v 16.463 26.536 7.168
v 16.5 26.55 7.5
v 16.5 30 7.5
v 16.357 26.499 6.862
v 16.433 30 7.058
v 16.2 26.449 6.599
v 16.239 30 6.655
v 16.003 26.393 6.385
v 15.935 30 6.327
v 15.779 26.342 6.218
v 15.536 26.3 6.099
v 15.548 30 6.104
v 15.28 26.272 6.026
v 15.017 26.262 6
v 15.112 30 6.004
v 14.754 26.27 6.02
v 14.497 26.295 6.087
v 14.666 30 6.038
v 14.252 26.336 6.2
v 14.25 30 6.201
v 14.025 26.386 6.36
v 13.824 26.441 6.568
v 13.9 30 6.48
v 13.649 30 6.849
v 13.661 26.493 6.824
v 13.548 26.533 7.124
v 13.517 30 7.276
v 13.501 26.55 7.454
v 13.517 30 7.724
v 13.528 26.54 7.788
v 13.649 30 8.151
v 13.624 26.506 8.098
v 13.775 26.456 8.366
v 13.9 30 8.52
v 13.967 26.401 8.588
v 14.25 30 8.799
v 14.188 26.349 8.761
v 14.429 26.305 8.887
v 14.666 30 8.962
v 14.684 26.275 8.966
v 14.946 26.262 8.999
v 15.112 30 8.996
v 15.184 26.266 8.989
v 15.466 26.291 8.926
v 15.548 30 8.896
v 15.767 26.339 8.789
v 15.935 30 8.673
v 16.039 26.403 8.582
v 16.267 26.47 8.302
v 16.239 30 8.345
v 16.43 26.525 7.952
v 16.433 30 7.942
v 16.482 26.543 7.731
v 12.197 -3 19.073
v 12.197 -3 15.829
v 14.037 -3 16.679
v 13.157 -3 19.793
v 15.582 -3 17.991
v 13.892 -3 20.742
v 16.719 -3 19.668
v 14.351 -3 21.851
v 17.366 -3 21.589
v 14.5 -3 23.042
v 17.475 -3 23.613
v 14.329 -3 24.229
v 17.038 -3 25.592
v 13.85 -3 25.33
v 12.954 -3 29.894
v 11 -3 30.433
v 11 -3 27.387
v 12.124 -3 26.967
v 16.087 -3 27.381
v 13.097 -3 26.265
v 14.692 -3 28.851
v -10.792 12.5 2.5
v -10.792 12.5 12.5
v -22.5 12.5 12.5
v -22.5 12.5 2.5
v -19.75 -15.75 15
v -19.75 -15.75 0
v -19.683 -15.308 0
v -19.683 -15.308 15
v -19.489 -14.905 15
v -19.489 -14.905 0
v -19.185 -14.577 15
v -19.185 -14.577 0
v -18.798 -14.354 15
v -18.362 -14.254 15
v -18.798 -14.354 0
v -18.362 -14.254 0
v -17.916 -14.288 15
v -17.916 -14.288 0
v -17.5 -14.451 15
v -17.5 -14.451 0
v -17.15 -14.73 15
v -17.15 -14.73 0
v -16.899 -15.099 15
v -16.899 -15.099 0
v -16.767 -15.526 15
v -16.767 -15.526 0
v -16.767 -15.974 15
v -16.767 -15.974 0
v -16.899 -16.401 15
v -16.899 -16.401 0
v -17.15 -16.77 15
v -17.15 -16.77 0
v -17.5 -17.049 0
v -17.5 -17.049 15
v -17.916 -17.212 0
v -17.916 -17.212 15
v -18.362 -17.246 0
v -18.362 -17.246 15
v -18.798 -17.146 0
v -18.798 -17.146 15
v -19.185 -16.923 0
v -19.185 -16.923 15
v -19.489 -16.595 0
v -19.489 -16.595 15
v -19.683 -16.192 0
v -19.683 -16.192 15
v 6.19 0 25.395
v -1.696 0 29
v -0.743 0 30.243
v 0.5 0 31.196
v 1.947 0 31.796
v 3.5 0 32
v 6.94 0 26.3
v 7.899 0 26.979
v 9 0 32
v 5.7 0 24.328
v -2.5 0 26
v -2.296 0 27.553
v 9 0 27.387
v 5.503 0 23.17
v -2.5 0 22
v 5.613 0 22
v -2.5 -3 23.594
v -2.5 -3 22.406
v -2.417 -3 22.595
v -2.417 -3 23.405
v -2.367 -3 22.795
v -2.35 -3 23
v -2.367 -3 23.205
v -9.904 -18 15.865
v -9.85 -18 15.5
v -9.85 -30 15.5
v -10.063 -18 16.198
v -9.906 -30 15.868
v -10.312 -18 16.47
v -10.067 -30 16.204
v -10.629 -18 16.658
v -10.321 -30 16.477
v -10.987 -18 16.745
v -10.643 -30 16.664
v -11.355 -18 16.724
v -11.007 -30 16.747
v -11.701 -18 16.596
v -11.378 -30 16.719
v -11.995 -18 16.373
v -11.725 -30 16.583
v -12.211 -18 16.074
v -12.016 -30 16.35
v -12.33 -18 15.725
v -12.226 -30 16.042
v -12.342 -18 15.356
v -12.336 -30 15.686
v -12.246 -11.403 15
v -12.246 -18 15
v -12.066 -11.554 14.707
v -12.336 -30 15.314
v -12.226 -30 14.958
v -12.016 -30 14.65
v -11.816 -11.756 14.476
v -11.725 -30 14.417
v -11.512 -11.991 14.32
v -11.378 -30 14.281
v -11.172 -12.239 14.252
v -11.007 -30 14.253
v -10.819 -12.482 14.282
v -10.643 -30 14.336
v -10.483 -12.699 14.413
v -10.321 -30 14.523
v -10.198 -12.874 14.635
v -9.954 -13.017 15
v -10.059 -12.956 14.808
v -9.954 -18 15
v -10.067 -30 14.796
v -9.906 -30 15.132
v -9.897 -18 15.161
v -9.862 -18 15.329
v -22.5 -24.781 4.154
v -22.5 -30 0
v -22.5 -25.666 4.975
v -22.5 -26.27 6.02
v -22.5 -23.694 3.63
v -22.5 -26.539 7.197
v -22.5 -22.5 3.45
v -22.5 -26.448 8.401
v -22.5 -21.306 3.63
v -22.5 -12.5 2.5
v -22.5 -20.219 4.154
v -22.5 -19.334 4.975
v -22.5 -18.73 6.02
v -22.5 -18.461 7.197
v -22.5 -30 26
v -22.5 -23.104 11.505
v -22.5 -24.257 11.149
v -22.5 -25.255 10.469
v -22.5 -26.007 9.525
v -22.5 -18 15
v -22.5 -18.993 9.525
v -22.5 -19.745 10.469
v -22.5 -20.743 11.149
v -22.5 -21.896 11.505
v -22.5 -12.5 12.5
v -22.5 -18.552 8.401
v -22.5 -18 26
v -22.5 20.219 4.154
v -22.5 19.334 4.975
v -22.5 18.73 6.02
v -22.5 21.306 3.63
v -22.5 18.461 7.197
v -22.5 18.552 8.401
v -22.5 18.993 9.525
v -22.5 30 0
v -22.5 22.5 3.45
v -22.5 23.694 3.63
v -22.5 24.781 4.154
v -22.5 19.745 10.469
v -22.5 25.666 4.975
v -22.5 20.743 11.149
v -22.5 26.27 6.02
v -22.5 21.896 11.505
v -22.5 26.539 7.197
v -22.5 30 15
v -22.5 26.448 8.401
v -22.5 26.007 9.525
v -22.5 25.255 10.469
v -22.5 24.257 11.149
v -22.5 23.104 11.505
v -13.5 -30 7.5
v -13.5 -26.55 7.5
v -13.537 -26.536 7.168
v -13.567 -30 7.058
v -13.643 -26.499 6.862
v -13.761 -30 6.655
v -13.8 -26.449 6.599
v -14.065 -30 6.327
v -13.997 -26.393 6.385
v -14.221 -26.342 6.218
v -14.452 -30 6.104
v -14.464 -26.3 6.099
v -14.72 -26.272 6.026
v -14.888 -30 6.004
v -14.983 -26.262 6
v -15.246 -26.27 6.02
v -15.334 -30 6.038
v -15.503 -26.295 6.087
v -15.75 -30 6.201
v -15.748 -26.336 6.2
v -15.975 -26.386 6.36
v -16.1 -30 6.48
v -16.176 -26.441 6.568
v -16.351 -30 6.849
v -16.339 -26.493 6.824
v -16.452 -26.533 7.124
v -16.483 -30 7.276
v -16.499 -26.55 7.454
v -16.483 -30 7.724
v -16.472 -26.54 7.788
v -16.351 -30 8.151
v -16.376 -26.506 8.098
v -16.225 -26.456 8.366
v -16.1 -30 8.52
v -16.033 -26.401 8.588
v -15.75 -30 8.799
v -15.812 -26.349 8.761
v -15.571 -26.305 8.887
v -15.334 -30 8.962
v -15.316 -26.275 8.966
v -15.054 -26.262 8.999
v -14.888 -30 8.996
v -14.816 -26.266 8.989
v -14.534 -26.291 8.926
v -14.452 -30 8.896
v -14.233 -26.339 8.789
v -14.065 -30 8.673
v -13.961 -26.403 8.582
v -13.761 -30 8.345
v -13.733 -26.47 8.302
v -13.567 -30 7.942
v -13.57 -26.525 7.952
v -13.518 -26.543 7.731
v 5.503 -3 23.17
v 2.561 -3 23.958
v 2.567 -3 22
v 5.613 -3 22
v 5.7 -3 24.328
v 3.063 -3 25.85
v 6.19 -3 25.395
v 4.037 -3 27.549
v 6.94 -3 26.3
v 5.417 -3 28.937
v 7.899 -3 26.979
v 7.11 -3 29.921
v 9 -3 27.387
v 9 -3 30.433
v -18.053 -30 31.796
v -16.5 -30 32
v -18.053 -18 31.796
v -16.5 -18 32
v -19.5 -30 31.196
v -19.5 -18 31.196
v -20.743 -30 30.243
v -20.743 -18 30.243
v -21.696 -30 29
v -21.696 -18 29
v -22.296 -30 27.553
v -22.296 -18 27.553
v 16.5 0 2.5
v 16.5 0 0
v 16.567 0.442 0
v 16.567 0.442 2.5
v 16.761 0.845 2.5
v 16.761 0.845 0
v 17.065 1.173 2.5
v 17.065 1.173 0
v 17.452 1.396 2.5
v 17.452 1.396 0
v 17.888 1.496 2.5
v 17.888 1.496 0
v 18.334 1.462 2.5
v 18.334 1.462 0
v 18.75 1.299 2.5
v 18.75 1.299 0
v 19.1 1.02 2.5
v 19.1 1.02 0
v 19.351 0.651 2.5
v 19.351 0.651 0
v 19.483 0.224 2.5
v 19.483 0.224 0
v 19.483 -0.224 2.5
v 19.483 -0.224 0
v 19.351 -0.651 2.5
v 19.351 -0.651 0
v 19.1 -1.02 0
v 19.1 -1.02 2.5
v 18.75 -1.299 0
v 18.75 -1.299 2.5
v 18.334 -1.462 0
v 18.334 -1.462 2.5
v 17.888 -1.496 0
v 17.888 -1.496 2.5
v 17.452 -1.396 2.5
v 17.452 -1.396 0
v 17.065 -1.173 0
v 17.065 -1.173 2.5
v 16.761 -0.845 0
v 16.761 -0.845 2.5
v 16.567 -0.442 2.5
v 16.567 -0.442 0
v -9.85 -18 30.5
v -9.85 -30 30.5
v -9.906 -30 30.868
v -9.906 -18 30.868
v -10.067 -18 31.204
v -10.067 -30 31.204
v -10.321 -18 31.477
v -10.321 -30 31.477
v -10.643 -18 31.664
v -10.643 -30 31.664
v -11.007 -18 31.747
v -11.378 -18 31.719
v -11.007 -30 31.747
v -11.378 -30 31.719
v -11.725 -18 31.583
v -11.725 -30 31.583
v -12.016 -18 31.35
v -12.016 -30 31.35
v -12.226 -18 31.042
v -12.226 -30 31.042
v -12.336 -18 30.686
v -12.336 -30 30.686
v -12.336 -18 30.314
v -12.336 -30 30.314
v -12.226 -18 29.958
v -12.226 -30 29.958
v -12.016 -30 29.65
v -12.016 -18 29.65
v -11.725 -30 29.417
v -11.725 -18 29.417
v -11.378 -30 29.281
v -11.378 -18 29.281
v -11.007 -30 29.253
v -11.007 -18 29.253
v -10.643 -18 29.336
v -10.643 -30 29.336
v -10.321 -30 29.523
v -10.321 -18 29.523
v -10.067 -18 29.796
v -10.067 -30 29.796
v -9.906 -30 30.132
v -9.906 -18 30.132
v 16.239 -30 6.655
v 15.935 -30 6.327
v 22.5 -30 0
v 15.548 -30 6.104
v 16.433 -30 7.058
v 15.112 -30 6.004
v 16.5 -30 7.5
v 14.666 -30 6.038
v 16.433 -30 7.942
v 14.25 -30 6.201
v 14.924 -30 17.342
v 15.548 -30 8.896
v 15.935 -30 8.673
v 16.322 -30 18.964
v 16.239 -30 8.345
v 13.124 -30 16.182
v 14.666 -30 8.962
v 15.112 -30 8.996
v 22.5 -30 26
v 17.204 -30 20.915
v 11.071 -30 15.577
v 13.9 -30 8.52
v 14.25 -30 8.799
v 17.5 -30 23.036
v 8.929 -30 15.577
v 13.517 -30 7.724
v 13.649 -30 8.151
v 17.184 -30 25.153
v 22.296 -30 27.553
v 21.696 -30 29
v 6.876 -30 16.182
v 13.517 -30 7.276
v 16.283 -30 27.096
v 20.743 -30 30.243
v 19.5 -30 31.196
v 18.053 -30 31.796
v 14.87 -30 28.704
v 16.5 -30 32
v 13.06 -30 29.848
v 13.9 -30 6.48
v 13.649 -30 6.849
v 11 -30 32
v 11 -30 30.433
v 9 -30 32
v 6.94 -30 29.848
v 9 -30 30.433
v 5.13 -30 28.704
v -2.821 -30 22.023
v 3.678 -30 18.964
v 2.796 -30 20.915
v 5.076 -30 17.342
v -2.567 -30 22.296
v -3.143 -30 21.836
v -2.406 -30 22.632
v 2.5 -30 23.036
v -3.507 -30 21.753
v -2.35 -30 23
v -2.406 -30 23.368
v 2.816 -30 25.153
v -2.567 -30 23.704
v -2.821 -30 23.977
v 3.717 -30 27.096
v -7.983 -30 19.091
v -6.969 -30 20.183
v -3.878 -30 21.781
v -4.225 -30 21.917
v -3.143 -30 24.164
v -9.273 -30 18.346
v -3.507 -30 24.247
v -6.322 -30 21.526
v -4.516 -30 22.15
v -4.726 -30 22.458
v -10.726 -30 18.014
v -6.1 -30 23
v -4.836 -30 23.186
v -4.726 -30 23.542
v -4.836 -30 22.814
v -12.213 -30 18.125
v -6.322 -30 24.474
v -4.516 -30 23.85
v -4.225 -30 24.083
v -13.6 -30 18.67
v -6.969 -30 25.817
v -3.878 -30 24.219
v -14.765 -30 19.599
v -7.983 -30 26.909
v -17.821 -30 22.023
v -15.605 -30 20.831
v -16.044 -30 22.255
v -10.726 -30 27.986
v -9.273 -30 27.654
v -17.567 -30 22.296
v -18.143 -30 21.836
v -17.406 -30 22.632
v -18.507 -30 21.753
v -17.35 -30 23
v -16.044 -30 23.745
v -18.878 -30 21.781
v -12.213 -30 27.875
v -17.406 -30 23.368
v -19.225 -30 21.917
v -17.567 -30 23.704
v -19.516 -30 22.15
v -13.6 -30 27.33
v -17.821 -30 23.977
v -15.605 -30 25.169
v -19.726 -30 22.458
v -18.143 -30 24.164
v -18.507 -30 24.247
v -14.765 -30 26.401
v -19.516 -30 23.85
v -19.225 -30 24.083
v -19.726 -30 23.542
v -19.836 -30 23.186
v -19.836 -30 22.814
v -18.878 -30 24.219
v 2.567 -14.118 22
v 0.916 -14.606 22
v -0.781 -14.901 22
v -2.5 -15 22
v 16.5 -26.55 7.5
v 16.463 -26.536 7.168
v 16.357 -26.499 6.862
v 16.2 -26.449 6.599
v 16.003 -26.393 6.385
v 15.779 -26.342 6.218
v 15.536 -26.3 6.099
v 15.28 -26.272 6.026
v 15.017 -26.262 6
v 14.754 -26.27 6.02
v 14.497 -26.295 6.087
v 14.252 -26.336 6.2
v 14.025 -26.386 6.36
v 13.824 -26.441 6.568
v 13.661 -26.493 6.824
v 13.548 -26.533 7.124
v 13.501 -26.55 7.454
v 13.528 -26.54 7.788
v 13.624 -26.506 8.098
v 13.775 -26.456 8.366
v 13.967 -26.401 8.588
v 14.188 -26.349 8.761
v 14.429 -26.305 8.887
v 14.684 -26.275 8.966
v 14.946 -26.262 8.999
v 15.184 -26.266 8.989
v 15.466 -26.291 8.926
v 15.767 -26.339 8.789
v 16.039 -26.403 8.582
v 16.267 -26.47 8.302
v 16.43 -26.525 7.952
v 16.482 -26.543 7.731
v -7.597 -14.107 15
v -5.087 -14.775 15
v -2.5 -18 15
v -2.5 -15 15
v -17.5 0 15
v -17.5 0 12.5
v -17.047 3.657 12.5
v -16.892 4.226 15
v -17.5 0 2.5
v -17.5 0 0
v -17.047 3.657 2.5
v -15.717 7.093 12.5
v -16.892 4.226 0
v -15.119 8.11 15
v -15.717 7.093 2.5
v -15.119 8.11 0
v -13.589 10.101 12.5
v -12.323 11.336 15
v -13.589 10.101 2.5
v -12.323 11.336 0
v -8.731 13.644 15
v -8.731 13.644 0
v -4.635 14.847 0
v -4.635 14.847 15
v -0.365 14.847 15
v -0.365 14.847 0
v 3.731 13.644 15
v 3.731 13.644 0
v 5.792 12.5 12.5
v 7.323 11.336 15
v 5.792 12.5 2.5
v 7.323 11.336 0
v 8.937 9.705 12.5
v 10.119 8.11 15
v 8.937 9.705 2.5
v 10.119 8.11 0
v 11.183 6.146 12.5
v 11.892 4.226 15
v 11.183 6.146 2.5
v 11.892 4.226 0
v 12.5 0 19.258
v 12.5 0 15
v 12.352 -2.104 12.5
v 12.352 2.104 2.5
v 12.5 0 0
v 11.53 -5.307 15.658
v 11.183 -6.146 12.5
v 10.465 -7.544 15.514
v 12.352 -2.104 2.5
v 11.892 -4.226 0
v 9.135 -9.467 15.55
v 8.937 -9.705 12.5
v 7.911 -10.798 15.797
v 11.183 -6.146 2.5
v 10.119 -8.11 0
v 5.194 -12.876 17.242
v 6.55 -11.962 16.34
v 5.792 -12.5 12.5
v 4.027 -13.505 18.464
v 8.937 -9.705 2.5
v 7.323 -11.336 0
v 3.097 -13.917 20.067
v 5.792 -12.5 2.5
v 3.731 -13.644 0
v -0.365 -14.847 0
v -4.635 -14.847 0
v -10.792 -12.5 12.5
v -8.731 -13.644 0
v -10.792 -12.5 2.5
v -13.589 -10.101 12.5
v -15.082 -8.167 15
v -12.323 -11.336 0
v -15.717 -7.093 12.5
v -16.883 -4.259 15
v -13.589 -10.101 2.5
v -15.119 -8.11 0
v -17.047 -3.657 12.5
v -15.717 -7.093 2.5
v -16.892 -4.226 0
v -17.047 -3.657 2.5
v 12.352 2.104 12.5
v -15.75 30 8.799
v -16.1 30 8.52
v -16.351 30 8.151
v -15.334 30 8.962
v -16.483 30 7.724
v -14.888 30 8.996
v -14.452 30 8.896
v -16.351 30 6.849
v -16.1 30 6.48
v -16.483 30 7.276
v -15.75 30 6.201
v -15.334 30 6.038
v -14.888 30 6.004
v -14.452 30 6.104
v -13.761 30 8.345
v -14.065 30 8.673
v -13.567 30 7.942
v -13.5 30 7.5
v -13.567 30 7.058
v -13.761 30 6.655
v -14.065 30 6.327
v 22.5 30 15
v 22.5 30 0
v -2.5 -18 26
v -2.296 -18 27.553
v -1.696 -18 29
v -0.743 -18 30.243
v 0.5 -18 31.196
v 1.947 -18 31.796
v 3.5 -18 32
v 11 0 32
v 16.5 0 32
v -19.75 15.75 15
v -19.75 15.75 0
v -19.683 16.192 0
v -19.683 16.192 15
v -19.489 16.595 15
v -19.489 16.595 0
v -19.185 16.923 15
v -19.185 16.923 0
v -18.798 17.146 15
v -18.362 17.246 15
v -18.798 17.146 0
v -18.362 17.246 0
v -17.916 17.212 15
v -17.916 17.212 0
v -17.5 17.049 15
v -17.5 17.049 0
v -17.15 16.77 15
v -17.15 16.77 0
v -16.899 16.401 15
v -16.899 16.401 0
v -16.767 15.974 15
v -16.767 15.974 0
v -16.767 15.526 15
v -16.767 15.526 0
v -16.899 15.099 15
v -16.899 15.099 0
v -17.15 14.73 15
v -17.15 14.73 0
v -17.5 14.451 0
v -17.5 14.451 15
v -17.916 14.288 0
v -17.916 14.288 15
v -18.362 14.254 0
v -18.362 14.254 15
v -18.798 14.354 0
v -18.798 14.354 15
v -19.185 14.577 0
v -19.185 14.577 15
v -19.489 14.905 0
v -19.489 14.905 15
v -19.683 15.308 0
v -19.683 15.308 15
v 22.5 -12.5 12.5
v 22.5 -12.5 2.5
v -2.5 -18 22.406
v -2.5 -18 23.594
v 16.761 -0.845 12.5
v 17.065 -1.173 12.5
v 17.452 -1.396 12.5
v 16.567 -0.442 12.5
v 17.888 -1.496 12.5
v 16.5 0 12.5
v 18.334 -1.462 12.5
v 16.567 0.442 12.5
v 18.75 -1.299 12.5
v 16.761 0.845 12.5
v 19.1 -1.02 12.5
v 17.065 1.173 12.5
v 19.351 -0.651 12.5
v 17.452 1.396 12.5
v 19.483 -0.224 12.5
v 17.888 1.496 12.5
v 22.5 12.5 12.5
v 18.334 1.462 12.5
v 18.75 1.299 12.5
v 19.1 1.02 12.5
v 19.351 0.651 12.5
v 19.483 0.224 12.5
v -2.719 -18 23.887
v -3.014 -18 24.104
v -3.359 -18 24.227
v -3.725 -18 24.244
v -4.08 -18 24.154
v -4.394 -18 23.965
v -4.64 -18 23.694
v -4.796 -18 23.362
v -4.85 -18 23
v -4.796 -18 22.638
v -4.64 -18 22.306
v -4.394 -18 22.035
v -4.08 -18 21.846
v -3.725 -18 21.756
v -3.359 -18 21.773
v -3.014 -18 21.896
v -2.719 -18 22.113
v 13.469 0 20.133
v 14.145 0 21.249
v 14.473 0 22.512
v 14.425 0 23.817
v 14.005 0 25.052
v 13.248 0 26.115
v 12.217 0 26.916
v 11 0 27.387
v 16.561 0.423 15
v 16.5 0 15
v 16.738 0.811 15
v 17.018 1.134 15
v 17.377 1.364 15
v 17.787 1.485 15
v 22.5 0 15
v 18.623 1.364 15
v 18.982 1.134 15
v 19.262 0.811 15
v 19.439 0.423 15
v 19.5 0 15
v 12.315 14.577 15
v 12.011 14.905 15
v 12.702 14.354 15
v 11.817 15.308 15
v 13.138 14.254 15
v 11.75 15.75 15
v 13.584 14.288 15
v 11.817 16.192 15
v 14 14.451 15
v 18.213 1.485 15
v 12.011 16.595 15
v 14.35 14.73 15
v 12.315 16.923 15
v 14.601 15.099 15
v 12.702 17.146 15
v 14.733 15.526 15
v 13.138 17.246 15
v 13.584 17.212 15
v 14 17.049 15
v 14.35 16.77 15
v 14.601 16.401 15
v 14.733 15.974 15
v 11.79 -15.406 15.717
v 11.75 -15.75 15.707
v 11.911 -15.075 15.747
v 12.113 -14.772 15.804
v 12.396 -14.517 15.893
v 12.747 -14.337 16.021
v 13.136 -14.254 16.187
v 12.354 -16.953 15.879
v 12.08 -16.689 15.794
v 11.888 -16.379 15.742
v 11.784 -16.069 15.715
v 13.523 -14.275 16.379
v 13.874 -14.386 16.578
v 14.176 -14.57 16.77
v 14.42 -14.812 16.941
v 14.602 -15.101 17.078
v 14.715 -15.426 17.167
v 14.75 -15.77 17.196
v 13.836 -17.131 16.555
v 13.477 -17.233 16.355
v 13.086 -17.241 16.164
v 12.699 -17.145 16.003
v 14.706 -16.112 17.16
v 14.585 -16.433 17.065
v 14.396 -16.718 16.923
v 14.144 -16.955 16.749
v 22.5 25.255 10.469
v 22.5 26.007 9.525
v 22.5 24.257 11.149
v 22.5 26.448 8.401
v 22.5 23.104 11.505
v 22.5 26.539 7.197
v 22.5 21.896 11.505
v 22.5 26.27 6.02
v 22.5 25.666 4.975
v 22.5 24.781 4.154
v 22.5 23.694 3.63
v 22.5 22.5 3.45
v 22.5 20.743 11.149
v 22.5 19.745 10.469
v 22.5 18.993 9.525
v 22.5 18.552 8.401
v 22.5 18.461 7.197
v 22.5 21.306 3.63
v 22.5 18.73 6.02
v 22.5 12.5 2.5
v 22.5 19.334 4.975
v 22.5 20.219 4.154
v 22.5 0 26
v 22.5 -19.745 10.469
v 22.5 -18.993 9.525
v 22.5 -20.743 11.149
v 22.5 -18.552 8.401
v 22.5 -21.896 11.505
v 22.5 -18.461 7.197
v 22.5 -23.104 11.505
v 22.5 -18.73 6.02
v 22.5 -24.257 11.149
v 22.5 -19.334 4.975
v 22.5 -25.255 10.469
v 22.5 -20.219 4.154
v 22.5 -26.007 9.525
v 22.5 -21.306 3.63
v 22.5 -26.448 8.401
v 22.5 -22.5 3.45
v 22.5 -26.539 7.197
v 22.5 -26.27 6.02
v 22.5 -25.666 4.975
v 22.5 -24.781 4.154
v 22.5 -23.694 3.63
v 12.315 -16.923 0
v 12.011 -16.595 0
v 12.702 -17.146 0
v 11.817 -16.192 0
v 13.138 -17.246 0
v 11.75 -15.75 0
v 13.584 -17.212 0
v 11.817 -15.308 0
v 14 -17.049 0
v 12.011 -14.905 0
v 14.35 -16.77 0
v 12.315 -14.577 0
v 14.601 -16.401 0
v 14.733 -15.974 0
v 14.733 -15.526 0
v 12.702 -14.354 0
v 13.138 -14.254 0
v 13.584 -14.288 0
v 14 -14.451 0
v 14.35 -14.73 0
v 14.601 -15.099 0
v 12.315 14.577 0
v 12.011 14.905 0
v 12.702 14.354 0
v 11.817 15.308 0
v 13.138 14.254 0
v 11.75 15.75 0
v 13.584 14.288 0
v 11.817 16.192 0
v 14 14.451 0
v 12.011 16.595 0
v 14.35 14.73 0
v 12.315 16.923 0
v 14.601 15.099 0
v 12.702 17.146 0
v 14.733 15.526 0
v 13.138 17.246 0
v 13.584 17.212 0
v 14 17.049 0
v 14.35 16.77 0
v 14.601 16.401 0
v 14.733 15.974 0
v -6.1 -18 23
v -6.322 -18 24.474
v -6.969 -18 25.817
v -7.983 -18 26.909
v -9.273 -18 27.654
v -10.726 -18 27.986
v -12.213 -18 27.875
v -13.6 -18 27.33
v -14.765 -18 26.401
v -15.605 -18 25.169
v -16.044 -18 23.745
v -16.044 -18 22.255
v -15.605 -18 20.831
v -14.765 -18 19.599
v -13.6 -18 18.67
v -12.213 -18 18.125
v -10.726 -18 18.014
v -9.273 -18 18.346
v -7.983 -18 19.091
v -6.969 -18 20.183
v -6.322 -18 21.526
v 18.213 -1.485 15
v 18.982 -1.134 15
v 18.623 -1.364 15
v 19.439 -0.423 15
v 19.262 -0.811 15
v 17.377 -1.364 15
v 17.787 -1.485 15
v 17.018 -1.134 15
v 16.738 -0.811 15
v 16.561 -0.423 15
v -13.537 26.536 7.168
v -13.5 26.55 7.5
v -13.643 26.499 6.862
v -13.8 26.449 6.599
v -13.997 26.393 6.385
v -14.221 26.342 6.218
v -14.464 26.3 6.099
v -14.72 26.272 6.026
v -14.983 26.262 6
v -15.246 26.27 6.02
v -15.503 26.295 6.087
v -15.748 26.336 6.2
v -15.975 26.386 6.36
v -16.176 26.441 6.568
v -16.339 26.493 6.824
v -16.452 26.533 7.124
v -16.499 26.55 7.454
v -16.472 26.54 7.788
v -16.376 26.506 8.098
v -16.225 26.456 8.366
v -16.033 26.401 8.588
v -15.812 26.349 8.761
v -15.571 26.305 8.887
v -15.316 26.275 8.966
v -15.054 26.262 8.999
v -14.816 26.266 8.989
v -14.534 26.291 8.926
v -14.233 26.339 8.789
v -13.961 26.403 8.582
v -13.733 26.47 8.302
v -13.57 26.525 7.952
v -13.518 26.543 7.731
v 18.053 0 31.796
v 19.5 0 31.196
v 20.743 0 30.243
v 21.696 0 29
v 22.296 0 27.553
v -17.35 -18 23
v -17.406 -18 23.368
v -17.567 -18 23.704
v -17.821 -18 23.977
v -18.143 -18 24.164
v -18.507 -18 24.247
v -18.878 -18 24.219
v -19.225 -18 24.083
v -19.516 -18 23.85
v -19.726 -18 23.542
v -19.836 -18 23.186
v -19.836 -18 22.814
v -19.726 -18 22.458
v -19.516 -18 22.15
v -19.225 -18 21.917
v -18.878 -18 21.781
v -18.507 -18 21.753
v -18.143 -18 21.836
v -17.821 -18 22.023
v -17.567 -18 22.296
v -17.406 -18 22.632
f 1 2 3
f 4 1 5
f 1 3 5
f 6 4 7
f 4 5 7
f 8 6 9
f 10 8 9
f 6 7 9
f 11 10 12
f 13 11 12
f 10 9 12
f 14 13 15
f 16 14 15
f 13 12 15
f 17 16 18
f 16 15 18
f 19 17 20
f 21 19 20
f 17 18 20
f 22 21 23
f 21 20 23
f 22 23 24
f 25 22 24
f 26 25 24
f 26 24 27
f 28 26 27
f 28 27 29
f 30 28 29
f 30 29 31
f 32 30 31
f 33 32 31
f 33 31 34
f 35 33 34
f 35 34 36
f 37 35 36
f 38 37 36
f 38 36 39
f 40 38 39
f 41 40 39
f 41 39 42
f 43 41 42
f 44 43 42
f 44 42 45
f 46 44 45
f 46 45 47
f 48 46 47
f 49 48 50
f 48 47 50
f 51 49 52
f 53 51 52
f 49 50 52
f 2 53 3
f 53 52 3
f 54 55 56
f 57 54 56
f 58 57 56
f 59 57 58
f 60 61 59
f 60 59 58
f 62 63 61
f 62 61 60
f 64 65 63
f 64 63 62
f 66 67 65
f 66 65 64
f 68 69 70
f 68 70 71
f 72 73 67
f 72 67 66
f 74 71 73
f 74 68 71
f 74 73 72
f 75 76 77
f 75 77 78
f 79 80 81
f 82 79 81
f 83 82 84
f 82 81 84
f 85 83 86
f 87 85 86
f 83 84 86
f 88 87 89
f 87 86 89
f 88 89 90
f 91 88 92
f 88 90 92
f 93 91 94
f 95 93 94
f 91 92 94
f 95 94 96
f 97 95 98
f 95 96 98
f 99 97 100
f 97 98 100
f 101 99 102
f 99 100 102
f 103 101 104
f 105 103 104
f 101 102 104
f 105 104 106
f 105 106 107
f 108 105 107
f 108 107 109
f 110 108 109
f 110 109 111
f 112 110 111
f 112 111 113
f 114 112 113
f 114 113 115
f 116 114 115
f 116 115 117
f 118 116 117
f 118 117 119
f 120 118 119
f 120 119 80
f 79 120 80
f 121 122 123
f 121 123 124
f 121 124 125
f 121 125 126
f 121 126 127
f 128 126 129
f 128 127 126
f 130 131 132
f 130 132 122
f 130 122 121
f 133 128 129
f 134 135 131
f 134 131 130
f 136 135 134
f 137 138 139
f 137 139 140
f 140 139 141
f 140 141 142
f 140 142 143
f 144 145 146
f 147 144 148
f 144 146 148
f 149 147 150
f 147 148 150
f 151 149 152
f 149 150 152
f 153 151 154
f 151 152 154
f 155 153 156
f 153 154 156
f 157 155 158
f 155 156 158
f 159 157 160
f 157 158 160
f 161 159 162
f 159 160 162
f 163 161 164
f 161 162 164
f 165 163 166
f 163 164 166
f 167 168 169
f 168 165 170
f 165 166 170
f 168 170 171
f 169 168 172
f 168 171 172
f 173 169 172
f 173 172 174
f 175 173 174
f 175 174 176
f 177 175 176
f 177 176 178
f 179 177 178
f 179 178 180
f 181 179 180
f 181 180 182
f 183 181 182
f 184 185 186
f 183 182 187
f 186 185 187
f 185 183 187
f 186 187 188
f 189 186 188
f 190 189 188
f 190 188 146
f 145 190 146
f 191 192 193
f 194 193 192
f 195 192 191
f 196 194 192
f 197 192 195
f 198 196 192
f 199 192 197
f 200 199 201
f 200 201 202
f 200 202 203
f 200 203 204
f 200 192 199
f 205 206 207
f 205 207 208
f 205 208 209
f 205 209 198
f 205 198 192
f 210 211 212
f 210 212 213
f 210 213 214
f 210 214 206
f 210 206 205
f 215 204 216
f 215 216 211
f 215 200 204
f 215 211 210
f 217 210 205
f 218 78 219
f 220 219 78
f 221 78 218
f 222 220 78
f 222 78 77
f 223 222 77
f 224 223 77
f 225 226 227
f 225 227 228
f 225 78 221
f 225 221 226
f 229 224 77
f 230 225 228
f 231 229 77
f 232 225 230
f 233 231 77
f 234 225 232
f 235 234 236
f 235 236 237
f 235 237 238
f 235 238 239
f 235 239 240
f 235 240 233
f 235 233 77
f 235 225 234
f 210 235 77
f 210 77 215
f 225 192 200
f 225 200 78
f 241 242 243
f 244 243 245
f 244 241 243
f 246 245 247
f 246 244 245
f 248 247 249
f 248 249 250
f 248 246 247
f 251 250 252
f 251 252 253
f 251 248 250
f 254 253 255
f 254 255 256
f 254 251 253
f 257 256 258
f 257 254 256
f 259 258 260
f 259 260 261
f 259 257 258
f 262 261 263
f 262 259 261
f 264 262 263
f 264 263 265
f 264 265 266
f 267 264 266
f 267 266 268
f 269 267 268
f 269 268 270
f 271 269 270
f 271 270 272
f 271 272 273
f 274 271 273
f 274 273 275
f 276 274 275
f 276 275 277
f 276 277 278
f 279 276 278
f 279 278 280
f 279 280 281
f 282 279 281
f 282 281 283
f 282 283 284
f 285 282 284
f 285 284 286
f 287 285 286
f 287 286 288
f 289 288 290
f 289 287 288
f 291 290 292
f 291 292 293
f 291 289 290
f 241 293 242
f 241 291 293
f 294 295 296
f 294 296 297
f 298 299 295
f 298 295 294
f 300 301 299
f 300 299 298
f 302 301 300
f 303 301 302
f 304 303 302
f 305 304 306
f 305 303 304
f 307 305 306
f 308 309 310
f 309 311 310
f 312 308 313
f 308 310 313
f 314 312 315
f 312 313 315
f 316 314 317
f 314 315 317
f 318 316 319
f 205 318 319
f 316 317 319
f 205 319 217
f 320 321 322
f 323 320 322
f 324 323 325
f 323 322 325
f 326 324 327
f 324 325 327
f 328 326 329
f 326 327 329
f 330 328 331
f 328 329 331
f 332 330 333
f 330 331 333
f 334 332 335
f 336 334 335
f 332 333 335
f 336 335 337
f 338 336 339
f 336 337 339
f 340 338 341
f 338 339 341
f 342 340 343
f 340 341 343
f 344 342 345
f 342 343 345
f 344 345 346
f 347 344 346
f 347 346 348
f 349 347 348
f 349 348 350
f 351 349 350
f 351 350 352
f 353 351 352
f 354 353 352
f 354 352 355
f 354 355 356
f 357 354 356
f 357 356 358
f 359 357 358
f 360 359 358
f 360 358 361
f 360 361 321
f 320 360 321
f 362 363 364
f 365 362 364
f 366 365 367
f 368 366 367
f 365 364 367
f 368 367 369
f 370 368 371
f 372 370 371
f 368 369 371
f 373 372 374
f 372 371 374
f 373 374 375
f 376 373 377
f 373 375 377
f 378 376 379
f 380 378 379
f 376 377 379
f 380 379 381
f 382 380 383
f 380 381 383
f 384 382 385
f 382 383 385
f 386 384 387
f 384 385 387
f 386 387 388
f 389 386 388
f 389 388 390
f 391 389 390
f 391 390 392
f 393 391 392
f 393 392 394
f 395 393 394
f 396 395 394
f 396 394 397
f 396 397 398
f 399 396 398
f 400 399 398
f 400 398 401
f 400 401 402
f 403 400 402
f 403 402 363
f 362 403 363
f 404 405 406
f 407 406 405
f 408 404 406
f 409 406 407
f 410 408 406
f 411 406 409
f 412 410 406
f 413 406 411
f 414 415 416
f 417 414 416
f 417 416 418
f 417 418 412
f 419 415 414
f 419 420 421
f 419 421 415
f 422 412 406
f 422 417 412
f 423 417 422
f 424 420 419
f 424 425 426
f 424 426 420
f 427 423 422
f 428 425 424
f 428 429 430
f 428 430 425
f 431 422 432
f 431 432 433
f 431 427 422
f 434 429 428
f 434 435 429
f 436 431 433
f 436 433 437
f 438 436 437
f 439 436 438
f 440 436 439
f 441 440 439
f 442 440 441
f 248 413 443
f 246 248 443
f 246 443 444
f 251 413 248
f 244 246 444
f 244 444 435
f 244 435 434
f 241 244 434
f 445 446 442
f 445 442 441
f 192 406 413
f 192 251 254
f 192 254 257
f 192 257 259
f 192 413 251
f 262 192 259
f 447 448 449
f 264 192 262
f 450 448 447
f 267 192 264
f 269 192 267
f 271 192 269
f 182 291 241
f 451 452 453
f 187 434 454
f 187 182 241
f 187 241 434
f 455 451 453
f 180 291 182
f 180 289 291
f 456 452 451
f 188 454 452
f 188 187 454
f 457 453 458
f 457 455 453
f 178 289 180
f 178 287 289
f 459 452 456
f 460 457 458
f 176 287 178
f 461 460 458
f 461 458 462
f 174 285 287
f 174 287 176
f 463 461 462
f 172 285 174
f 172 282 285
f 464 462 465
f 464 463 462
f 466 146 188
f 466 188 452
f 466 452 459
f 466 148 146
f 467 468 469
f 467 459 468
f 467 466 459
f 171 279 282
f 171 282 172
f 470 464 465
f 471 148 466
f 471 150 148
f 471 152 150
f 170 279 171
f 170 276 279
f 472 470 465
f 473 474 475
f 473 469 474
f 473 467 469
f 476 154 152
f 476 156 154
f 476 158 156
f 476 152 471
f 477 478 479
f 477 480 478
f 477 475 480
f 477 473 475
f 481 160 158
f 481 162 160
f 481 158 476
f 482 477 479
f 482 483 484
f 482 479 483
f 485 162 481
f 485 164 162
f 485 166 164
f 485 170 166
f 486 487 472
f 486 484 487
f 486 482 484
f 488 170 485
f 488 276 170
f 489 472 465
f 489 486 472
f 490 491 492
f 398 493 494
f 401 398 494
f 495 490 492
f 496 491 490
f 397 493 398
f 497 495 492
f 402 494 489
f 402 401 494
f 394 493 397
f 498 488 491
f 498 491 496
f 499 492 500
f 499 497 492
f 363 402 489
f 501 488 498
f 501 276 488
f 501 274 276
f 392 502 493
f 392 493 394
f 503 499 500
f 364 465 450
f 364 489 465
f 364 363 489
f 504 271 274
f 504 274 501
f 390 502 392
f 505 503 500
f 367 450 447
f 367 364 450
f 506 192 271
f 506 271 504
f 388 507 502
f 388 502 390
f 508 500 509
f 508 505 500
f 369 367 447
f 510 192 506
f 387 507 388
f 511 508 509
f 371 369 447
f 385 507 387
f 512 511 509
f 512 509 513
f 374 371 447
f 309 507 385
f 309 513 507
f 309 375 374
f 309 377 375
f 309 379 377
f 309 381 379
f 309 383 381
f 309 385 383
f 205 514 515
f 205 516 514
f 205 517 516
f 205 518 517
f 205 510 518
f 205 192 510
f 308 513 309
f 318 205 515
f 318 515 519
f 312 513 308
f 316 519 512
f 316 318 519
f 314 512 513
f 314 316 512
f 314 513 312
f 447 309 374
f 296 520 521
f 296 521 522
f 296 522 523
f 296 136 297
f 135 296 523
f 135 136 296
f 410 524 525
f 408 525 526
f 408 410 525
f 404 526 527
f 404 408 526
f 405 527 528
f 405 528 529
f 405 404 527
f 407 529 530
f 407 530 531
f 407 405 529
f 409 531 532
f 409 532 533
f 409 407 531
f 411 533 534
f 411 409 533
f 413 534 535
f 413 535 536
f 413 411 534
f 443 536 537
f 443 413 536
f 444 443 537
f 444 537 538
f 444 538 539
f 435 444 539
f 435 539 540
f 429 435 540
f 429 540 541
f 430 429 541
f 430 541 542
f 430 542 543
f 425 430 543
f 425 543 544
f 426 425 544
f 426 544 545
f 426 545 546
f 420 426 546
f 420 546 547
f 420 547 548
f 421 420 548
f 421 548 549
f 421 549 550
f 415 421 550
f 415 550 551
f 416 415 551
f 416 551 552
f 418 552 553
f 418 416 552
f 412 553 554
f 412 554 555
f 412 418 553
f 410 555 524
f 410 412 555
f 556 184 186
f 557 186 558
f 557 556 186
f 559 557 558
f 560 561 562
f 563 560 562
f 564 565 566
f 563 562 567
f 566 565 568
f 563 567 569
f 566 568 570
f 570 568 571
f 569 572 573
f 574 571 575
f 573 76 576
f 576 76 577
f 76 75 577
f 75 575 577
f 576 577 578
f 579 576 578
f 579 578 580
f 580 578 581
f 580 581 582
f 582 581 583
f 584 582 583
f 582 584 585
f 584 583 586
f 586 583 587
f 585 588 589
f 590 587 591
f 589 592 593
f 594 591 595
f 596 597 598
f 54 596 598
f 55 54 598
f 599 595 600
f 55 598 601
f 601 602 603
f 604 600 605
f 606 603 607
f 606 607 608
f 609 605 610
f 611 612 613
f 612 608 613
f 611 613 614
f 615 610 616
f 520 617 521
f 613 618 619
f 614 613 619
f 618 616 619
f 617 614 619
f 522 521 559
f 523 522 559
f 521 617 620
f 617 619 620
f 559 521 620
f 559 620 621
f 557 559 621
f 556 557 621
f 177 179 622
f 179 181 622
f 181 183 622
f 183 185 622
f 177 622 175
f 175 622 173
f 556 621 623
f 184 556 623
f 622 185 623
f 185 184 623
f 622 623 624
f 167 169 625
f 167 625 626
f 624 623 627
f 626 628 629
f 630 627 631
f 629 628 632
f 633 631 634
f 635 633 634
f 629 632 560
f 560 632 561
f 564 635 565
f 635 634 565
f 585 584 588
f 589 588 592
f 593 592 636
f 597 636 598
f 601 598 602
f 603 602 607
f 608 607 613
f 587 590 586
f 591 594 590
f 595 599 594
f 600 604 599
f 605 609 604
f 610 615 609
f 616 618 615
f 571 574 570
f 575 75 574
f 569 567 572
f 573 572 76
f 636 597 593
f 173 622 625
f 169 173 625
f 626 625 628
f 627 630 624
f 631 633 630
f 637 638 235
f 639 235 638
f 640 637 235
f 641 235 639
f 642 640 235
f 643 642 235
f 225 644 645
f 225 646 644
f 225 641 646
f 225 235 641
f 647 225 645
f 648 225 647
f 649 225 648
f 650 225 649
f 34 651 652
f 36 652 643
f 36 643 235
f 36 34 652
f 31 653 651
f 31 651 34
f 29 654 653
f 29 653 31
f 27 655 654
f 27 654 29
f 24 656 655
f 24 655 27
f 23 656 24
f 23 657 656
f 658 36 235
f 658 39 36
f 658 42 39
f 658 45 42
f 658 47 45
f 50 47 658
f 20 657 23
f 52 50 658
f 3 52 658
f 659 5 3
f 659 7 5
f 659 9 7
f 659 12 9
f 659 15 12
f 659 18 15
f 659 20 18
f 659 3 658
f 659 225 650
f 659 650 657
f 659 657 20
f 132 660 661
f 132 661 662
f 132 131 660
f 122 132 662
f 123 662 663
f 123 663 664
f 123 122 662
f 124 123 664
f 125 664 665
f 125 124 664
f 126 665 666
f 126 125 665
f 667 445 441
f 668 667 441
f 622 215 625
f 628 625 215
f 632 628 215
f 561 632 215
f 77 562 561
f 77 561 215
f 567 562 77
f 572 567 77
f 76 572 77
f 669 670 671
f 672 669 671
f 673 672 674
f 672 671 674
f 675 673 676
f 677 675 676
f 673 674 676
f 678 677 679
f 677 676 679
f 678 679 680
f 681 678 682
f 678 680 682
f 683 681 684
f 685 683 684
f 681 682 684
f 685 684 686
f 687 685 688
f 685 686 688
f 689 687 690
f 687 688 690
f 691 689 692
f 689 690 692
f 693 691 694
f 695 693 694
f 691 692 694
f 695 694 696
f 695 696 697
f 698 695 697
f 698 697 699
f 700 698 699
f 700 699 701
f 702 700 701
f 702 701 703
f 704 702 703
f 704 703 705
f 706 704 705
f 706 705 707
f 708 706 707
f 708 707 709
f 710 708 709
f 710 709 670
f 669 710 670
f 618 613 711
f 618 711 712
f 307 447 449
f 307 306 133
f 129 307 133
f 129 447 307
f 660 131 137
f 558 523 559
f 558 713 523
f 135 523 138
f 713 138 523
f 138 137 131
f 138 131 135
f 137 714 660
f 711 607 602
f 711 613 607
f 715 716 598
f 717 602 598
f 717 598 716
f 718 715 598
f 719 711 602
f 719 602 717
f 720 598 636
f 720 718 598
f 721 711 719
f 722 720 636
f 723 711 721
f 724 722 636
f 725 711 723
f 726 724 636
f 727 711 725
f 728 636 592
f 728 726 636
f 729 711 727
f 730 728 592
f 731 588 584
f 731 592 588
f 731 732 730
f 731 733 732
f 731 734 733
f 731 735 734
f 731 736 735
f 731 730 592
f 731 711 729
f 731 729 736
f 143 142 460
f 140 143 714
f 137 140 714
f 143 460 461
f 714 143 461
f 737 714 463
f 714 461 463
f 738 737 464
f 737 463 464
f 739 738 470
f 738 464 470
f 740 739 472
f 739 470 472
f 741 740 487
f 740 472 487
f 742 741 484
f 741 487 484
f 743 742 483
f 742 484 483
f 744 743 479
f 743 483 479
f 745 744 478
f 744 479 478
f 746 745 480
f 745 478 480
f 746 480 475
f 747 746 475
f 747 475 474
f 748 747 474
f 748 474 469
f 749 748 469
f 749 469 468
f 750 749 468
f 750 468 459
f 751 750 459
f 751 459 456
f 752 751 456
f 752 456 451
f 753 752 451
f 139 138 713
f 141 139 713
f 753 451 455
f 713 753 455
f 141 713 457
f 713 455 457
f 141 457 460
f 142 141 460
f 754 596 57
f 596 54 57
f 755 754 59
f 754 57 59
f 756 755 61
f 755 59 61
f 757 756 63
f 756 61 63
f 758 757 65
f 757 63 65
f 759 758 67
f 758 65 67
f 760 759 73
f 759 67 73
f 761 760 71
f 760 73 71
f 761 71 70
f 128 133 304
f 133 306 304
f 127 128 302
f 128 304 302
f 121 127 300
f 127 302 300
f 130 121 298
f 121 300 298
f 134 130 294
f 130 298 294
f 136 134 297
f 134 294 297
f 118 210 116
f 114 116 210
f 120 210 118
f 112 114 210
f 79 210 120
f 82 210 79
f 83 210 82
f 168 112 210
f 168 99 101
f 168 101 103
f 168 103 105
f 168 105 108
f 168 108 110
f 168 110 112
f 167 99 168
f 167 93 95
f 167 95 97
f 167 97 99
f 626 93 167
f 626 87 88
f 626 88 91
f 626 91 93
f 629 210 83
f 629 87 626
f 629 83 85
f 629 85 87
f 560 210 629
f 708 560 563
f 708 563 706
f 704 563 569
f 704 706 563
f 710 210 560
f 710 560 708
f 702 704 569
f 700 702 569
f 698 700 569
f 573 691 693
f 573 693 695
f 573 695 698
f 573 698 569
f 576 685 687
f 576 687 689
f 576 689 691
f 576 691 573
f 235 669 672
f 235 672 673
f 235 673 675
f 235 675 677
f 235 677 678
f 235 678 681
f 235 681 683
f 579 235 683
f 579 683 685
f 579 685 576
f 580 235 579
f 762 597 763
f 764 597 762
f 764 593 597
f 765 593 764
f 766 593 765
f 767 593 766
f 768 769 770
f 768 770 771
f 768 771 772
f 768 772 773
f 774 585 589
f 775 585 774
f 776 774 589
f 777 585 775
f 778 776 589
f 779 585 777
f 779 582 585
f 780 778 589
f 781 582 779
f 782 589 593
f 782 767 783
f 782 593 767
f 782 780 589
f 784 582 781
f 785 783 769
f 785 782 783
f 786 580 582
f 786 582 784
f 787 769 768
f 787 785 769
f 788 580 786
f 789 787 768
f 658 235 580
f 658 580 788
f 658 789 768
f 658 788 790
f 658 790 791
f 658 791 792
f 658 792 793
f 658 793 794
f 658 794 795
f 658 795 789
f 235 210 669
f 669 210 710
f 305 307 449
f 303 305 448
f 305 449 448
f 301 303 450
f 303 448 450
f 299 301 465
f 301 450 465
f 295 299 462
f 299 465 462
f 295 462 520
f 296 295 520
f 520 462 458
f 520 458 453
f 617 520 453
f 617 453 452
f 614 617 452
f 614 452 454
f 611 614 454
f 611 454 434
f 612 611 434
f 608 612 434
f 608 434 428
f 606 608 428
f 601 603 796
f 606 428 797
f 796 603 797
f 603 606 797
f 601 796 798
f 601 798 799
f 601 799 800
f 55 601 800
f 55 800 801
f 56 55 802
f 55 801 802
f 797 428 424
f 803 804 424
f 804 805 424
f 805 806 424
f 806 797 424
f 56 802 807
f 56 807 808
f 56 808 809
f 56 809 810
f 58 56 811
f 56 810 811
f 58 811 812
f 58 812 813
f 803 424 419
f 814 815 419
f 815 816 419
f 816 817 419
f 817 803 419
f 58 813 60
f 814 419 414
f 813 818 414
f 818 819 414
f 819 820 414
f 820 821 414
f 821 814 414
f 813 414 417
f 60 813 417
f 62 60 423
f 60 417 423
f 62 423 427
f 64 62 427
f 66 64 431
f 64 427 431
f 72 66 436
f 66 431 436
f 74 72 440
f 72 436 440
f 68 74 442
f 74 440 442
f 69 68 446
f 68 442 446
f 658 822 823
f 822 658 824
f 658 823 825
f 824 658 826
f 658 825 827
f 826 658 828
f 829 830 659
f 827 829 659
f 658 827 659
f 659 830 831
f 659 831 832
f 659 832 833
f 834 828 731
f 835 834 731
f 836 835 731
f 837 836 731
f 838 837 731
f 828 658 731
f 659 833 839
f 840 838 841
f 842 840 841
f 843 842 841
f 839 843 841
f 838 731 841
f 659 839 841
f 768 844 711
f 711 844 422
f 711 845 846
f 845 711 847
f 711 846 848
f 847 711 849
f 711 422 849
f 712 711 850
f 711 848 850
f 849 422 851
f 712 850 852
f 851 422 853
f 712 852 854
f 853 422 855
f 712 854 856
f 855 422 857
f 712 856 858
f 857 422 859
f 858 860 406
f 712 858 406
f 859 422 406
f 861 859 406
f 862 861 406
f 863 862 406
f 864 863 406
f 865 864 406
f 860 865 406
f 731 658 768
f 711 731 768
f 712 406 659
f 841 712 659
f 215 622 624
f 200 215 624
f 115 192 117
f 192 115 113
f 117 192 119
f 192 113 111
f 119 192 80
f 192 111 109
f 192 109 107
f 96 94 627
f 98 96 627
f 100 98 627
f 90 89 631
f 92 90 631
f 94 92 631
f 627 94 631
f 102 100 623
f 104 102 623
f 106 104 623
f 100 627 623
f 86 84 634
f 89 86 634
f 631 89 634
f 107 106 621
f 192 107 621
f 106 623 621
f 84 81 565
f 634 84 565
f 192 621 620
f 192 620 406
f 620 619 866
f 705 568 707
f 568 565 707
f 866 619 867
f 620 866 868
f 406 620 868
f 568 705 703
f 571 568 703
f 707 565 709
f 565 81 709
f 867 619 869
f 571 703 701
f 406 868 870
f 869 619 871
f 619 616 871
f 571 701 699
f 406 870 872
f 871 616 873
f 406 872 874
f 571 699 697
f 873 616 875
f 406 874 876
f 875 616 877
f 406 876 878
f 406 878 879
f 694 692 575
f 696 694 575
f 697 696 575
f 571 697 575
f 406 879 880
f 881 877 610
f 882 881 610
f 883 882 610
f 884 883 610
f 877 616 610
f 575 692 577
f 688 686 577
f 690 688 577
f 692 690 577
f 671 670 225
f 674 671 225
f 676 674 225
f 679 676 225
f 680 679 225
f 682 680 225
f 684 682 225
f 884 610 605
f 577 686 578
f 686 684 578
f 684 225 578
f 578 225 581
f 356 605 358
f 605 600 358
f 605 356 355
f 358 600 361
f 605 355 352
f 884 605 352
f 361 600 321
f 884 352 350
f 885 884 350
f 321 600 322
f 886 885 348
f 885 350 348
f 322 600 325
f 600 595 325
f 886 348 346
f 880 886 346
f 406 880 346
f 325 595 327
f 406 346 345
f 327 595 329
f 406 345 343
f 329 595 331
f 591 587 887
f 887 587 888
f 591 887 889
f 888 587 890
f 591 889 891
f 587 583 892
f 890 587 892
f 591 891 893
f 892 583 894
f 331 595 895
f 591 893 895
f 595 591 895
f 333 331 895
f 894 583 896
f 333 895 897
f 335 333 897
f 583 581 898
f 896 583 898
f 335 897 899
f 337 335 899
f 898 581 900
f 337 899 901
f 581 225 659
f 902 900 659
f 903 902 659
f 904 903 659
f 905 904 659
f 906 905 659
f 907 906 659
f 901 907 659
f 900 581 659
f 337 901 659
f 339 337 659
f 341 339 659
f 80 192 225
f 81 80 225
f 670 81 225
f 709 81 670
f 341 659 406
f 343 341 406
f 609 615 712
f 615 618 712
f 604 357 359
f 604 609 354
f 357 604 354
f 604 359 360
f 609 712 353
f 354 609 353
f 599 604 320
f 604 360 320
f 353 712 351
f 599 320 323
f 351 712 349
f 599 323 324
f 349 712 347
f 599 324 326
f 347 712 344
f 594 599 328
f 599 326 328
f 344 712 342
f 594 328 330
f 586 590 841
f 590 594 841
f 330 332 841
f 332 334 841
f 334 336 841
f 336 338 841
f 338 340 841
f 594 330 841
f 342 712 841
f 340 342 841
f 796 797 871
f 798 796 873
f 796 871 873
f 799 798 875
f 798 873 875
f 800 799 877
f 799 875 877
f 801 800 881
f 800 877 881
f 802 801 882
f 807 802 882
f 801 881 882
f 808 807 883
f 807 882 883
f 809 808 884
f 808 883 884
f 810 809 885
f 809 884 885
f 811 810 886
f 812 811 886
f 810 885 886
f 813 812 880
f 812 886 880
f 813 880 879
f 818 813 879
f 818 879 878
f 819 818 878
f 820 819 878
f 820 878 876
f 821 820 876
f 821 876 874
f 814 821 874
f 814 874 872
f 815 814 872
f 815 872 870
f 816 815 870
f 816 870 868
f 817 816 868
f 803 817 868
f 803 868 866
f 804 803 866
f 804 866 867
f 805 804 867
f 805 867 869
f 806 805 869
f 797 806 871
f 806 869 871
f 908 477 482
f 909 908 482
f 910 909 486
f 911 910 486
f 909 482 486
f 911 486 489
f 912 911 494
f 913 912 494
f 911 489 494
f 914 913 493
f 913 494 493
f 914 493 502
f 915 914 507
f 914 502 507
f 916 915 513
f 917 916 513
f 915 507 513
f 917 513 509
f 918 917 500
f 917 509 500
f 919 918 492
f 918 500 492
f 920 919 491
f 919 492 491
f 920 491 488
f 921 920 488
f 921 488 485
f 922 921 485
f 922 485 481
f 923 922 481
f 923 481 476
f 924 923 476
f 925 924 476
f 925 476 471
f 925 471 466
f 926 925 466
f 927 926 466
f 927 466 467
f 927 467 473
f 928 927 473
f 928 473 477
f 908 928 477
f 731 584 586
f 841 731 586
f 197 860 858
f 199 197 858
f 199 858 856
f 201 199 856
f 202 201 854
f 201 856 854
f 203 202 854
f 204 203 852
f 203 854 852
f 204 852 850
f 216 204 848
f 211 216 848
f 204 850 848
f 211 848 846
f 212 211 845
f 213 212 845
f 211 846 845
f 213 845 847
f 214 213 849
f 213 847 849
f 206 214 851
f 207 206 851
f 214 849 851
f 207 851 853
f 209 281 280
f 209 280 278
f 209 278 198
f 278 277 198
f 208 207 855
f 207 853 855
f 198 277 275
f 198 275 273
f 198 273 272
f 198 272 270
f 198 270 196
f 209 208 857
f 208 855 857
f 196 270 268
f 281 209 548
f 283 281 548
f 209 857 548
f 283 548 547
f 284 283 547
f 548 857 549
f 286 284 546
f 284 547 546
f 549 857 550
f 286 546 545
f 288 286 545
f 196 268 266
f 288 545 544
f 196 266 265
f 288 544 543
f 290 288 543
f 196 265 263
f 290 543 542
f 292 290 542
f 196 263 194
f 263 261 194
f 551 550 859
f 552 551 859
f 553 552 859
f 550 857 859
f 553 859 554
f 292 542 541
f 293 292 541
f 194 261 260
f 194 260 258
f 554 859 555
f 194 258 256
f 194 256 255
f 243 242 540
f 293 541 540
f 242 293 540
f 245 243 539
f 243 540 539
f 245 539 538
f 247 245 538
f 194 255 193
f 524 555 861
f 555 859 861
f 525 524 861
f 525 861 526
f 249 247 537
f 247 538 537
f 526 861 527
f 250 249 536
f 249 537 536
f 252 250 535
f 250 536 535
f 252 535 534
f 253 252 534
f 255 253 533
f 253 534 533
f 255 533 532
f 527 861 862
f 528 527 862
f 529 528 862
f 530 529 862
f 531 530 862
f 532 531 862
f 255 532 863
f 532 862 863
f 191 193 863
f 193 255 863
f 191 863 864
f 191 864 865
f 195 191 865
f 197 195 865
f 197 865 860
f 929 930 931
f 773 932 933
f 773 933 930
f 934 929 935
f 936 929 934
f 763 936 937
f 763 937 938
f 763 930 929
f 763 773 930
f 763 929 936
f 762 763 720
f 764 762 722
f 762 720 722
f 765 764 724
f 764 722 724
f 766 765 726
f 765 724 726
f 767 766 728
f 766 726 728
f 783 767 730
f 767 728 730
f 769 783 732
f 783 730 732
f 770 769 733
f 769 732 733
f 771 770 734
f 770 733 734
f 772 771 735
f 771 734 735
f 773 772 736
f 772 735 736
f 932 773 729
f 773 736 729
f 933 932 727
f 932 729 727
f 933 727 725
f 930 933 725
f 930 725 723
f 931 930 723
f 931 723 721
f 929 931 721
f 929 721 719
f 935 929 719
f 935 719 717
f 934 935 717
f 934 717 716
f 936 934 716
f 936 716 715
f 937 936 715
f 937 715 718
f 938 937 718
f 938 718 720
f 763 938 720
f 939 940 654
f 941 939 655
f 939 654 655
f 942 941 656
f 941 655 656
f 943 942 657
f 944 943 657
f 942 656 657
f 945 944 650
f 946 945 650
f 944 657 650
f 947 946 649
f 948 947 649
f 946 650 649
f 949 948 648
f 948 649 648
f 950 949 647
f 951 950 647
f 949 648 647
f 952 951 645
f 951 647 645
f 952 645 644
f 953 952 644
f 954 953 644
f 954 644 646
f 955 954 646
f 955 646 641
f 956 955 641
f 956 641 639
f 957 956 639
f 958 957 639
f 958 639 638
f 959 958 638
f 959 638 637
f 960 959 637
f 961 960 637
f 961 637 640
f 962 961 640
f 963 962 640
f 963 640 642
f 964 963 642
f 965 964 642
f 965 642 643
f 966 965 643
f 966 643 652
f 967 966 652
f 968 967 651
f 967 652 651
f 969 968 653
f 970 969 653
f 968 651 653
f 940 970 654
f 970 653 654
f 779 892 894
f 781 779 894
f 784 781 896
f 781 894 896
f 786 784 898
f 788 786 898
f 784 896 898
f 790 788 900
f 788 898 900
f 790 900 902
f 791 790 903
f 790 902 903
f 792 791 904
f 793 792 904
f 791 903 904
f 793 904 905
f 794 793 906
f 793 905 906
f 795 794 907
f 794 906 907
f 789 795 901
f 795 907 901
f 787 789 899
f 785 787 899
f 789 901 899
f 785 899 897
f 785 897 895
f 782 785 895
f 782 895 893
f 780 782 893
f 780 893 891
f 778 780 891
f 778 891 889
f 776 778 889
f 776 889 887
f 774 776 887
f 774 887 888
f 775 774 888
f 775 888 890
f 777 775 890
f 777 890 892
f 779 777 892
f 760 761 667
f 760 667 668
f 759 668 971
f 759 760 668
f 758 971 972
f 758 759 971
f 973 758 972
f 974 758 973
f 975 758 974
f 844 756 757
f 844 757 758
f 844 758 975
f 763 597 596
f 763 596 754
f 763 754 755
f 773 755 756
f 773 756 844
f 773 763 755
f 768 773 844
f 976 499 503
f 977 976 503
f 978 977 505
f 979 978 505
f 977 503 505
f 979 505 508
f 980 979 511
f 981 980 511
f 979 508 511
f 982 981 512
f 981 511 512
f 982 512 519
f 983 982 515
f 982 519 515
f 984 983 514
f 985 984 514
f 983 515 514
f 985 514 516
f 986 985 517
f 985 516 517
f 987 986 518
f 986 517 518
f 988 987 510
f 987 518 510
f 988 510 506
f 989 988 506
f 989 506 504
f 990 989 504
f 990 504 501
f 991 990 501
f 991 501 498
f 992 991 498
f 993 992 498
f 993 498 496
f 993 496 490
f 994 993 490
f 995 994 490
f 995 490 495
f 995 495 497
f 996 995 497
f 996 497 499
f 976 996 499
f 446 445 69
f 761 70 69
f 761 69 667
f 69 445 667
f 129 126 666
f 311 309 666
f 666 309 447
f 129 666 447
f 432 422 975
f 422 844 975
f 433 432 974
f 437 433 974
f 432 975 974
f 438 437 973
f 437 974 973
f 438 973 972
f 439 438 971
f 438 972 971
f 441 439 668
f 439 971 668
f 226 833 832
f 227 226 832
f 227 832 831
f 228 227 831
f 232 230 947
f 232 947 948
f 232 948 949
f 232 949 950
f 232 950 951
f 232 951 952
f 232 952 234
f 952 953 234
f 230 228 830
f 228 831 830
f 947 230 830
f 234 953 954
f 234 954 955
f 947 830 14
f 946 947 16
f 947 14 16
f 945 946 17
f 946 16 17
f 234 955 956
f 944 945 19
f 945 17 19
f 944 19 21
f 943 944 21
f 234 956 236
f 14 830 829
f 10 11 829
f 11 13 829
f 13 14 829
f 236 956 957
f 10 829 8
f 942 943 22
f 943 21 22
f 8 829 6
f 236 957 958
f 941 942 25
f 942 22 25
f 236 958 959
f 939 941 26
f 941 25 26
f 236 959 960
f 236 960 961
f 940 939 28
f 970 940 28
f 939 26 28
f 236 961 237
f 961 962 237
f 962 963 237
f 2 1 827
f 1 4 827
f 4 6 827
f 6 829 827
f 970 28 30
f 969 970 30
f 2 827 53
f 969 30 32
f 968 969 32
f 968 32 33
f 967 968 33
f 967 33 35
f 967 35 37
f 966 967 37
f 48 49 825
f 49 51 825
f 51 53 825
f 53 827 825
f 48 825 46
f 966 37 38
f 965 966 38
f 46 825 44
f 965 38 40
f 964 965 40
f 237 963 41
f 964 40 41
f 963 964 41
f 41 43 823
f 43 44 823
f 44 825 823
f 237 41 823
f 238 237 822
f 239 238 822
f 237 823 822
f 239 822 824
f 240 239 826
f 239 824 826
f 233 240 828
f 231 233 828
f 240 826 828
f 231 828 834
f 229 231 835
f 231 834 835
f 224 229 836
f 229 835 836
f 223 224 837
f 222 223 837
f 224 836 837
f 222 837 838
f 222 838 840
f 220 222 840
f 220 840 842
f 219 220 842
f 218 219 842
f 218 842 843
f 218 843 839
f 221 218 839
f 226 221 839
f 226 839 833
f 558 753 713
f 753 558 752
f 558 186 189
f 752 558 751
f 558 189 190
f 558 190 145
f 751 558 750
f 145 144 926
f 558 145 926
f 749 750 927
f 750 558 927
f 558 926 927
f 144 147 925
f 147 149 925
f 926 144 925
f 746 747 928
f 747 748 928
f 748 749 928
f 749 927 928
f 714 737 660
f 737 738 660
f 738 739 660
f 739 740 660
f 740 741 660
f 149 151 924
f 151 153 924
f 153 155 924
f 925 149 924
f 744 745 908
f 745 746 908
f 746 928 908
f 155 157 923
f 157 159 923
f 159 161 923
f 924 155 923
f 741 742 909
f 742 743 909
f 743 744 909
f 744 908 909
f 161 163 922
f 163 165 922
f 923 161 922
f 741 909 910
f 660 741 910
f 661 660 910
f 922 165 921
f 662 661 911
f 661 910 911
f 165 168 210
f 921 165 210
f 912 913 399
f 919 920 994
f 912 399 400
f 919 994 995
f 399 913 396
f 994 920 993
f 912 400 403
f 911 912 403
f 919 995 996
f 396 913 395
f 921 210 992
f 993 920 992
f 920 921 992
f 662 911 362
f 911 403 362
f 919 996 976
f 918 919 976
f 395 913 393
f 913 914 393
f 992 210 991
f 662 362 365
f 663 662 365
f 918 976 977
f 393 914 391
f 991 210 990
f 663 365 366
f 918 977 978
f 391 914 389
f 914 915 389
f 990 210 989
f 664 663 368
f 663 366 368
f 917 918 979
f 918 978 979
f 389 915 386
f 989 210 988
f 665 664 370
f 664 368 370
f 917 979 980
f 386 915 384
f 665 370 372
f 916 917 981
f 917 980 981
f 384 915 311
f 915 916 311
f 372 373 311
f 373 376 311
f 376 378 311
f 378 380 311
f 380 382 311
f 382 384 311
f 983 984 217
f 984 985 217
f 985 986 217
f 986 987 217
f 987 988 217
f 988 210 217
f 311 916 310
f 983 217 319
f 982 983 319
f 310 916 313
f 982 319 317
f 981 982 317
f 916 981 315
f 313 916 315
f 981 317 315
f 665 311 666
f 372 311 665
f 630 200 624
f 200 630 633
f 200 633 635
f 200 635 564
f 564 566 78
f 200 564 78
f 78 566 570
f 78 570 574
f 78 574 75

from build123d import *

# Parameters (mm, degrees)
SKETCH1_W           = 45
SKETCH1_H           = 60
BOSS_EXTRUDE1_DEPTH = 15
SKETCH2_R           = 4.05
SKETCH2_W           = 10
SKETCH2_H           = 25
CUT_EXTRUDE1_DEPTH  = 46
SKETCH3_W           = 17
SKETCH3_H           = 12
BOSS_EXTRUDE2_DEPTH = 45
SKETCH4_W           = 25
SKETCH4_H           = 17
BOSS_EXTRUDE3_DEPTH = 18
SKETCH5_W           = 2
SKETCH5_H           = 30
CUT_EXTRUDE2_DEPTH  = 5
SKETCH6_R           = 4.5
CUT_EXTRUDE3_DEPTH  = 61
SKETCH7_R           = 7.5
SKETCH7_R_2         = 5
SKETCH7_R_3         = 1.25
CUT_EXTRUDE4_DEPTH  = 27
SKETCH8_R           = 15
SKETCH8_R_2         = 1.5
CUT_EXTRUDE5_DEPTH  = 22
FILLET1_R           = 6
SKETCH9_R           = 1.5
CUT_EXTRUDE6_DEPTH  = 15
SKETCH10_R          = 1.5
CUT_EXTRUDE7_DEPTH  = 5
CUT_EXTRUDE8_START  = -60
SKETCH10_2_R        = 1.5
CUT_EXTRUDE8_DEPTH  = 5


with BuildPart() as part:
    # Sketch1 → Boss-Extrude1 (new body)
    with BuildSketch(Plane.XY):
        Rectangle(SKETCH1_W, SKETCH1_H)
    extrude(amount=BOSS_EXTRUDE1_DEPTH)

    # Sketch2 → Cut-Extrude1 (cut, through all)
    with BuildSketch(Plane(origin=(22.5, 0, 0), x_dir=(0, 0, -1), z_dir=(1, 0, 0))):
        with Locations((-7.5, 22.5)):
            Circle(SKETCH2_R)
        with Locations((-7.5, -22.5)):
            Circle(SKETCH2_R)
        with Locations((-7.5, 0)):
            Rectangle(SKETCH2_W, SKETCH2_H)
    extrude(amount=-CUT_EXTRUDE1_DEPTH, mode=Mode.SUBTRACT)

    # Sketch3 → Boss-Extrude2 (add)
    with BuildSketch(Plane.ZY.offset(22.5)):
        with Locations((23.5, -24)):
            Rectangle(SKETCH3_W, SKETCH3_H)
    extrude(amount=-BOSS_EXTRUDE2_DEPTH)

    # Sketch4 → Boss-Extrude3 (add)
    with BuildSketch(Plane(origin=(0, -18, 0), x_dir=(1, 0, 0), z_dir=(0, 1, 0))):
        with Locations((10, -23.5)):
            Rectangle(SKETCH4_W, SKETCH4_H)
    extrude(amount=BOSS_EXTRUDE3_DEPTH)

    # Sketch5 → Cut-Extrude2 (cut)
    with BuildSketch(Plane.XY.offset(32)):
        with Locations((10, -15)):
            Rectangle(SKETCH5_W, SKETCH5_H)
    extrude(amount=-CUT_EXTRUDE2_DEPTH, mode=Mode.SUBTRACT)

    # Sketch6 → Cut-Extrude3 (cut, through all)
    with BuildSketch(Plane.XZ.offset(30)):
        with Locations((10, 23)):
            Circle(SKETCH6_R)
    extrude(amount=-CUT_EXTRUDE3_DEPTH, mode=Mode.SUBTRACT)

    # Sketch7 → Cut-Extrude4 (cut)
    with BuildSketch(Plane.XZ.offset(30)):
        with Locations((10, 23)):
            Circle(SKETCH7_R)
        with Locations((-11.1, 23)):
            Circle(SKETCH7_R_2)
        with Locations((-3.6, 23)):
            Circle(SKETCH7_R_3)
        with Locations((-11.1, 30.5)):
            Circle(SKETCH7_R_3)
        with Locations((-11.1, 15.5)):
            Circle(SKETCH7_R_3)
        with Locations((-18.6, 23)):
            Circle(SKETCH7_R_3)
    extrude(amount=-CUT_EXTRUDE4_DEPTH, mode=Mode.SUBTRACT)

    # Sketch8 → Cut-Extrude5 (cut)
    with BuildSketch(Plane(origin=(0, 0, 0), x_dir=(-1, 0, 0), z_dir=(0, 0, -1))):
        with Locations((2.5, 0)):
            Circle(SKETCH8_R)
        with Locations((18.25, 15.75)):
            Circle(SKETCH8_R_2)
        with Locations((-13.25, 15.75)):
            Circle(SKETCH8_R_2)
        with Locations((-13.25, -15.75)):
            Circle(SKETCH8_R_2)
        with Locations((18.25, -15.75)):
            Circle(SKETCH8_R_2)
    extrude(amount=-CUT_EXTRUDE5_DEPTH, mode=Mode.SUBTRACT)

    # Fillet1
    fillet1_edges = [part.edges().sort_by_distance(p)[0] for p in [
        (-22.5, -24, 32),
        (-2.5, -9, 32),
        (22.5, -15, 32),
    ]]
    fillet(fillet1_edges, radius=FILLET1_R)

    # Sketch9 → Cut-Extrude6 (cut)
    with BuildSketch(Plane(origin=(0, 0, 0), x_dir=(-1, 0, 0), z_dir=(0, 0, -1))):
        with Locations((-18, 0)):
            Circle(SKETCH9_R)
    extrude(amount=-CUT_EXTRUDE6_DEPTH, mode=Mode.SUBTRACT)

    # Sketch10 → Cut-Extrude7 (cut)
    with BuildSketch(Plane(origin=(0, 30, 0), x_dir=(1, 0, 0), z_dir=(0, 1, 0))):
        with Locations((-15, -7.5)):
            Circle(SKETCH10_R)
        with Locations((15, -7.5)):
            Circle(SKETCH10_R)
    extrude(amount=-CUT_EXTRUDE7_DEPTH, mode=Mode.SUBTRACT)

    # Sketch10<2> → Cut-Extrude8 (cut)
    with BuildSketch(Plane(origin=(0, 30, 0), x_dir=(1, 0, 0), z_dir=(0, 1, 0)).offset(CUT_EXTRUDE8_START)):
        with Locations((-15, -7.5)):
            Circle(SKETCH10_2_R)
        with Locations((15, -7.5)):
            Circle(SKETCH10_2_R)
    extrude(amount=CUT_EXTRUDE8_DEPTH, mode=Mode.SUBTRACT)


solid = part.part
